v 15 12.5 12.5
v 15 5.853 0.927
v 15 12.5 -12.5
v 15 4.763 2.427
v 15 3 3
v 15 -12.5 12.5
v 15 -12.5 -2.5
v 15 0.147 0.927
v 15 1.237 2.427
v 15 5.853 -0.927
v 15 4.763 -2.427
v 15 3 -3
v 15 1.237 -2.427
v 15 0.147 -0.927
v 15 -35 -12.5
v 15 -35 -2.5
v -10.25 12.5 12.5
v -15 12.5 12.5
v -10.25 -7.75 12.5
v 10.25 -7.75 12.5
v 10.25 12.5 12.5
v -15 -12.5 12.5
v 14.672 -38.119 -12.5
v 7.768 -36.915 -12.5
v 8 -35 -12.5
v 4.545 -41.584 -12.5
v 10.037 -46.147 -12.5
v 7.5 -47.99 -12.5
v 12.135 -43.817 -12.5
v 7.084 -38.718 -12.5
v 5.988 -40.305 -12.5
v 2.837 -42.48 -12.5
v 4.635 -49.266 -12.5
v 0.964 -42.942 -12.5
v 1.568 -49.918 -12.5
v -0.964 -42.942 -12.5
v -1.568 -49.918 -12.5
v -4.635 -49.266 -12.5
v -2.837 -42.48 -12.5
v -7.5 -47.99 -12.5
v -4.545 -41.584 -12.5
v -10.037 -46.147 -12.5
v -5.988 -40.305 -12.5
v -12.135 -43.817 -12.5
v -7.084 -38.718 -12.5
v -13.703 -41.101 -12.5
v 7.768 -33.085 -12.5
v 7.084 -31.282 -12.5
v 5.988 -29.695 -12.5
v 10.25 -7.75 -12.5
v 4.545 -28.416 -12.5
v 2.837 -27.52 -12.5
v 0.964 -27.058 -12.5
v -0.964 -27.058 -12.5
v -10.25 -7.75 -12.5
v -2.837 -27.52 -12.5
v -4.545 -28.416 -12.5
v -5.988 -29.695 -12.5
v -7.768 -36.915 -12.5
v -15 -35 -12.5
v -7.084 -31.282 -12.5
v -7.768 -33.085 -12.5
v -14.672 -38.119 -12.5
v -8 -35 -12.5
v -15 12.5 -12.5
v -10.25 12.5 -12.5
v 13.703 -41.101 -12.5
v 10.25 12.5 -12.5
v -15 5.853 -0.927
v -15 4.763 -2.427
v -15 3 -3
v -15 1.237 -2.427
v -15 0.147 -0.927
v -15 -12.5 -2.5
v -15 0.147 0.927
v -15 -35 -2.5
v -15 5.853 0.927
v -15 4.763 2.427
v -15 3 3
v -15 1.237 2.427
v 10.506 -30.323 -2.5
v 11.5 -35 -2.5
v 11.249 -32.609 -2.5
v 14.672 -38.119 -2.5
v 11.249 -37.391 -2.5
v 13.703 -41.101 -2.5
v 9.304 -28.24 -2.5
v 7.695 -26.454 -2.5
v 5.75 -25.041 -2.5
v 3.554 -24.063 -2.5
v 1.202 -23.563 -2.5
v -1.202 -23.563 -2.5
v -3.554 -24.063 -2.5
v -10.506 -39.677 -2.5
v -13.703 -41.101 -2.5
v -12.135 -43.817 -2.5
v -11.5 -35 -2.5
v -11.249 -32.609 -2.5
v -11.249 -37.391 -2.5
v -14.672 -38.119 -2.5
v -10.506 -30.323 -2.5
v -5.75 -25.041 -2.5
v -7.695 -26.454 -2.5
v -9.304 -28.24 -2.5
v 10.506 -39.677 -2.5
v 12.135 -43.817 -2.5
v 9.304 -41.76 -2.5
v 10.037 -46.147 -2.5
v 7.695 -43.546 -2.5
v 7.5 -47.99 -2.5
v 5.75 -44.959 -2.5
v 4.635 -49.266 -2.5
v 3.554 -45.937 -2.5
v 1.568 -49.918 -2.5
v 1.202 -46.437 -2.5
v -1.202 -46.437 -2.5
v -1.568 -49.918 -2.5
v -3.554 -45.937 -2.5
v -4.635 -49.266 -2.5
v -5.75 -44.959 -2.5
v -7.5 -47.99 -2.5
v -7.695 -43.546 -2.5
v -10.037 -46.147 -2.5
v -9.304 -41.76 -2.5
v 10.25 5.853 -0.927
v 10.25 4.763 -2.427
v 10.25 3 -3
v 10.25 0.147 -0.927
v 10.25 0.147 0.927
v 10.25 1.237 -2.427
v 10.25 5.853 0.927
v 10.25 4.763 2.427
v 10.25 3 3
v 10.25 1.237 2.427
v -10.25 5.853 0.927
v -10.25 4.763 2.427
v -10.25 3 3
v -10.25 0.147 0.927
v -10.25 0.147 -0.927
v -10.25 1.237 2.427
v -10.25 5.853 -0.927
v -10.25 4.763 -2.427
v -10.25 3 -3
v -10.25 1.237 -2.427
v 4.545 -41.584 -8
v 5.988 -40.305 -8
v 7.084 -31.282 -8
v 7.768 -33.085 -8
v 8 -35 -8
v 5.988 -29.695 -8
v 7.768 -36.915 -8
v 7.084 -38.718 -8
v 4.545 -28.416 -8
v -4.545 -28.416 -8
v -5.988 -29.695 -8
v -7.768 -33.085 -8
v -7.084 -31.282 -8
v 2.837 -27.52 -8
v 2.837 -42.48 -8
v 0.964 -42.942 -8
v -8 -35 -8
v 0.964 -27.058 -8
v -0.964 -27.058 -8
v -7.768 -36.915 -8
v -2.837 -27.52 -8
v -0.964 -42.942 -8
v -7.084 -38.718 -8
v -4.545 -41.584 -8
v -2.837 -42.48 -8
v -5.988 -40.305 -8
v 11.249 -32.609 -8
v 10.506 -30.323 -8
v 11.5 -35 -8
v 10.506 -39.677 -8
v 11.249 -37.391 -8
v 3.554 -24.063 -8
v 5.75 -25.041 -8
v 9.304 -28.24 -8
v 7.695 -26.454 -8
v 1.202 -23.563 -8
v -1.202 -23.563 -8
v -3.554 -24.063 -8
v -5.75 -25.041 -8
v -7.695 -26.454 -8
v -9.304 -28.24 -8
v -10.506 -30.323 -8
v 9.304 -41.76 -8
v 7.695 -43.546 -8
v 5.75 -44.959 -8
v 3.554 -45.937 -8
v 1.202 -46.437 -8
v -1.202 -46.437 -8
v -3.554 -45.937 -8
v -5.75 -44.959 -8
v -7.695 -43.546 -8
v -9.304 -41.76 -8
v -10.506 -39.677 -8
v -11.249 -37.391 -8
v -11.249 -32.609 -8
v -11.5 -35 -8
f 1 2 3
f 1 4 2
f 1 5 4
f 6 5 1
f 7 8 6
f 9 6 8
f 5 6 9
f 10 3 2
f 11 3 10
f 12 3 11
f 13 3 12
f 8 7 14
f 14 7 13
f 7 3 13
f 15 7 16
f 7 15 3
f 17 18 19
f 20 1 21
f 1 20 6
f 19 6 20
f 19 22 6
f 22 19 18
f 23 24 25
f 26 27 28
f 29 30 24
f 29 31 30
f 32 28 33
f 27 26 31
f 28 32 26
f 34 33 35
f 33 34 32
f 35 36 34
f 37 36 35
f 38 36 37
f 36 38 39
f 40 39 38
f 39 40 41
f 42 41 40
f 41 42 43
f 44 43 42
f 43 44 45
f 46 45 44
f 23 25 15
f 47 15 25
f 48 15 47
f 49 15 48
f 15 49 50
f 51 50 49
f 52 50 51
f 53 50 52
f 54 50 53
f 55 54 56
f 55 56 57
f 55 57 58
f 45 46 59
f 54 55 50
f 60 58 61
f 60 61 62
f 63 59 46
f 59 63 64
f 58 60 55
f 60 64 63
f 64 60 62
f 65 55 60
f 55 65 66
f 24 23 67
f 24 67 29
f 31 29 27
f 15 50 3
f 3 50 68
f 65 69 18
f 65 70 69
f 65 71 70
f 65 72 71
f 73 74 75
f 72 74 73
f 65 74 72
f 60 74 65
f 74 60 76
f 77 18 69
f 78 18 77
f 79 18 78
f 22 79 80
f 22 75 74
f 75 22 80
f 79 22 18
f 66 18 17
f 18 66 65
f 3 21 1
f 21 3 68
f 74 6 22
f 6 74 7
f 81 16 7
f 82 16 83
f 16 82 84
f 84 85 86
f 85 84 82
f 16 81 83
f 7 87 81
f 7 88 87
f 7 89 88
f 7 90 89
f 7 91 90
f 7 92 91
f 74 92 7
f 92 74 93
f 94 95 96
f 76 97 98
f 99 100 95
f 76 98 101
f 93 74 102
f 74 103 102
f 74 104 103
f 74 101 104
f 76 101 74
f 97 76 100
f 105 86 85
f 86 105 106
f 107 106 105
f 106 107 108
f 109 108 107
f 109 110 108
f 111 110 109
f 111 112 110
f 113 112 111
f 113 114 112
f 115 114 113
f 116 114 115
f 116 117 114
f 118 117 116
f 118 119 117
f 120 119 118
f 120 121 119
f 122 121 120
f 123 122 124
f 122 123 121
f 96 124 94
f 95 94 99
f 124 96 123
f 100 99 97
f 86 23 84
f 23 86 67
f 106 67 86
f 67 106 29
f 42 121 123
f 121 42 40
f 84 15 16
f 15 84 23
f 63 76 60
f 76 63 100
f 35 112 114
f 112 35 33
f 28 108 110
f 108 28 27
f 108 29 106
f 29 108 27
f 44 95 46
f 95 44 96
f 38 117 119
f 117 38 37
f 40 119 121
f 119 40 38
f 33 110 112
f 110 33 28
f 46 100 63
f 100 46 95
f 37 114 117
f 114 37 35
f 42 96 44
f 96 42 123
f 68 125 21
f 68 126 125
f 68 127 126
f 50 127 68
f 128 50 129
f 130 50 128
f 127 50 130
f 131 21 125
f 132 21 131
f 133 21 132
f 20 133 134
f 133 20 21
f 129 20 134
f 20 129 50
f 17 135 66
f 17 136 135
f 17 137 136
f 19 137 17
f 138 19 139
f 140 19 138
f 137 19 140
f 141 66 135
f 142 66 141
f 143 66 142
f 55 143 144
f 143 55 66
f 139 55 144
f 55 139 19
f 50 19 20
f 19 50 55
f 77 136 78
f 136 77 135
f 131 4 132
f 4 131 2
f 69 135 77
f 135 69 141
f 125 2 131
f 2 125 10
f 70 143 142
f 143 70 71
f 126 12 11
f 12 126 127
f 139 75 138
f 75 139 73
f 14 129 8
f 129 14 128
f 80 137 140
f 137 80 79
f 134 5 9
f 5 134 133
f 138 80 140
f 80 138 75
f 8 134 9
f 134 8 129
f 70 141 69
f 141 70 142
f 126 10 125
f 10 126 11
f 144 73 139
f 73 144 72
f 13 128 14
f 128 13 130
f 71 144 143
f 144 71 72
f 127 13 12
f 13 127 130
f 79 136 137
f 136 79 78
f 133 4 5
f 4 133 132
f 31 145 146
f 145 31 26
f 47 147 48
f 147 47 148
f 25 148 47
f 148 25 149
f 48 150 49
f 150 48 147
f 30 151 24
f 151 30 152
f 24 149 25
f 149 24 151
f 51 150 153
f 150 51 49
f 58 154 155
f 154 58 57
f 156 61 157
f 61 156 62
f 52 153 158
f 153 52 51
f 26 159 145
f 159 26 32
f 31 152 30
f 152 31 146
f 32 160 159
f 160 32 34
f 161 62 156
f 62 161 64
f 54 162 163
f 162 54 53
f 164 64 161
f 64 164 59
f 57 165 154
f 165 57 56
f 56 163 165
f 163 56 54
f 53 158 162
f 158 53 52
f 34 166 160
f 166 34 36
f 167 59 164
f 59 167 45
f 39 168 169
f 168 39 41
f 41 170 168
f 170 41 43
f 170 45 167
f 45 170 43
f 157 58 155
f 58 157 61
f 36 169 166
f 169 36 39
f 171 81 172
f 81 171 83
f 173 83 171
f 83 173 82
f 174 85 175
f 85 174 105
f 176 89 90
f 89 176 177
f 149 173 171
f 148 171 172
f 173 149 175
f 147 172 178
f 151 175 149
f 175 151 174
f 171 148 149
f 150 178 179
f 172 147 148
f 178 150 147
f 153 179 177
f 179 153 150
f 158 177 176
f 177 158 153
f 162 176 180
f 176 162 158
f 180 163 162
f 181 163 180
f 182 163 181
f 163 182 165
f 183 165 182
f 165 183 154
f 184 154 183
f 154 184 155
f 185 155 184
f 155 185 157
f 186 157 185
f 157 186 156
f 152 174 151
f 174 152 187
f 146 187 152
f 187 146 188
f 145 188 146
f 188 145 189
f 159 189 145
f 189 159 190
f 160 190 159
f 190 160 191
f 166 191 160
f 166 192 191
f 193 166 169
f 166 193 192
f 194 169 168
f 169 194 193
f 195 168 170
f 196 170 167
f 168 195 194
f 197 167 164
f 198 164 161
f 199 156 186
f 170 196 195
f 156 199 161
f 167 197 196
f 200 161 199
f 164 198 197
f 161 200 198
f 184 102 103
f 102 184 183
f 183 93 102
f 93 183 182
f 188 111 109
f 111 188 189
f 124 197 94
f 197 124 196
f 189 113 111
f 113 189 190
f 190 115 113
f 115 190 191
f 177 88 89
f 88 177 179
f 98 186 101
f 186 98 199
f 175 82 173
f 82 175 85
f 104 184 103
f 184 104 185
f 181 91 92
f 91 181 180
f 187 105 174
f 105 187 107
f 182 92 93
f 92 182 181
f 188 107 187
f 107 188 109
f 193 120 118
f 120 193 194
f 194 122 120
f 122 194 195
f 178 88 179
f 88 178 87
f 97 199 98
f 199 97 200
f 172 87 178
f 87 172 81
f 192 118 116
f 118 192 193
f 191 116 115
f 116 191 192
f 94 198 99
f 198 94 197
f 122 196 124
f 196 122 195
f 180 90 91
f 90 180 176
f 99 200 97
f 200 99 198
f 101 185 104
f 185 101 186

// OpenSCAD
// file: Rook_Config.scad
// Rook 3D Printer Configuration
// Created By Jeffrey Olijar 
// Jolijar@gmail.com

// Layer Height
LH = 0.38;

// 608 skate bearing
Bearing_OD = 23; 
Bearing_ID = 8;
Bearing_H = 7;

// M3 Nut Diameter
N3 = 7.5;

// M3 Screw Hole Diameter
M3 = 4.25;

// M4 Screw Hole Diameter
M4 = 5.25;
N4 = 8.75;

// M5 Screw Hole Diameter
M5 = 6;

// M8 Rod Diameter (configure for a tight fit)
M8 = 8.2;

// M8 Nut Diameter
N8 = 15.5;

//LM8UU Bearing
LBD = 15.4; // Diameter
LBH = 25; // Height
LBI = 8;  // Inner Diameter

//Makergear Groovemount
GVO = 16.5; // Outside Diameter
GVI = 12.5;  // Inside Groove Diameter

// Distance Between Centers for X rods
DBCX = 70;
// main file
// Rook 3D Printer 
// Z Bearing
// Created By Jeffrey Olijar 
// Jolijar@gmail.com
// Revision 1.00
// 2 x requred 


include <Rook_Config.scad>

module Rook_Z_Bearing(){

difference(){ 
union(){
// Misumi Rail Box
translate(v=[0,0,0]){ cube(size = [30,25,25], center = true);}


translate(v=[0,-23.5,-7.5]){ cube(size = [30,23,10], center = true);}
translate(v=[0,-35,-12.5]){cylinder(h = 10, r=15);}

}

union(){
// Misumi Rail Cutout
translate(v=[0,2.5,0]){ cube(size = [20.5,20.5,26], center = true);}
translate(v=[-20,3,0])rotate(a=[0,90,0]){cylinder(h=100,r=M5/2);}

translate(v=[0,-35,-25]){cylinder(h = 100, r=Bearing_ID);}
translate(v=[0,-35,-8]){ cylinder(h = Bearing_H, r=Bearing_OD/2);}

}}}
Rook_Z_Bearing();
